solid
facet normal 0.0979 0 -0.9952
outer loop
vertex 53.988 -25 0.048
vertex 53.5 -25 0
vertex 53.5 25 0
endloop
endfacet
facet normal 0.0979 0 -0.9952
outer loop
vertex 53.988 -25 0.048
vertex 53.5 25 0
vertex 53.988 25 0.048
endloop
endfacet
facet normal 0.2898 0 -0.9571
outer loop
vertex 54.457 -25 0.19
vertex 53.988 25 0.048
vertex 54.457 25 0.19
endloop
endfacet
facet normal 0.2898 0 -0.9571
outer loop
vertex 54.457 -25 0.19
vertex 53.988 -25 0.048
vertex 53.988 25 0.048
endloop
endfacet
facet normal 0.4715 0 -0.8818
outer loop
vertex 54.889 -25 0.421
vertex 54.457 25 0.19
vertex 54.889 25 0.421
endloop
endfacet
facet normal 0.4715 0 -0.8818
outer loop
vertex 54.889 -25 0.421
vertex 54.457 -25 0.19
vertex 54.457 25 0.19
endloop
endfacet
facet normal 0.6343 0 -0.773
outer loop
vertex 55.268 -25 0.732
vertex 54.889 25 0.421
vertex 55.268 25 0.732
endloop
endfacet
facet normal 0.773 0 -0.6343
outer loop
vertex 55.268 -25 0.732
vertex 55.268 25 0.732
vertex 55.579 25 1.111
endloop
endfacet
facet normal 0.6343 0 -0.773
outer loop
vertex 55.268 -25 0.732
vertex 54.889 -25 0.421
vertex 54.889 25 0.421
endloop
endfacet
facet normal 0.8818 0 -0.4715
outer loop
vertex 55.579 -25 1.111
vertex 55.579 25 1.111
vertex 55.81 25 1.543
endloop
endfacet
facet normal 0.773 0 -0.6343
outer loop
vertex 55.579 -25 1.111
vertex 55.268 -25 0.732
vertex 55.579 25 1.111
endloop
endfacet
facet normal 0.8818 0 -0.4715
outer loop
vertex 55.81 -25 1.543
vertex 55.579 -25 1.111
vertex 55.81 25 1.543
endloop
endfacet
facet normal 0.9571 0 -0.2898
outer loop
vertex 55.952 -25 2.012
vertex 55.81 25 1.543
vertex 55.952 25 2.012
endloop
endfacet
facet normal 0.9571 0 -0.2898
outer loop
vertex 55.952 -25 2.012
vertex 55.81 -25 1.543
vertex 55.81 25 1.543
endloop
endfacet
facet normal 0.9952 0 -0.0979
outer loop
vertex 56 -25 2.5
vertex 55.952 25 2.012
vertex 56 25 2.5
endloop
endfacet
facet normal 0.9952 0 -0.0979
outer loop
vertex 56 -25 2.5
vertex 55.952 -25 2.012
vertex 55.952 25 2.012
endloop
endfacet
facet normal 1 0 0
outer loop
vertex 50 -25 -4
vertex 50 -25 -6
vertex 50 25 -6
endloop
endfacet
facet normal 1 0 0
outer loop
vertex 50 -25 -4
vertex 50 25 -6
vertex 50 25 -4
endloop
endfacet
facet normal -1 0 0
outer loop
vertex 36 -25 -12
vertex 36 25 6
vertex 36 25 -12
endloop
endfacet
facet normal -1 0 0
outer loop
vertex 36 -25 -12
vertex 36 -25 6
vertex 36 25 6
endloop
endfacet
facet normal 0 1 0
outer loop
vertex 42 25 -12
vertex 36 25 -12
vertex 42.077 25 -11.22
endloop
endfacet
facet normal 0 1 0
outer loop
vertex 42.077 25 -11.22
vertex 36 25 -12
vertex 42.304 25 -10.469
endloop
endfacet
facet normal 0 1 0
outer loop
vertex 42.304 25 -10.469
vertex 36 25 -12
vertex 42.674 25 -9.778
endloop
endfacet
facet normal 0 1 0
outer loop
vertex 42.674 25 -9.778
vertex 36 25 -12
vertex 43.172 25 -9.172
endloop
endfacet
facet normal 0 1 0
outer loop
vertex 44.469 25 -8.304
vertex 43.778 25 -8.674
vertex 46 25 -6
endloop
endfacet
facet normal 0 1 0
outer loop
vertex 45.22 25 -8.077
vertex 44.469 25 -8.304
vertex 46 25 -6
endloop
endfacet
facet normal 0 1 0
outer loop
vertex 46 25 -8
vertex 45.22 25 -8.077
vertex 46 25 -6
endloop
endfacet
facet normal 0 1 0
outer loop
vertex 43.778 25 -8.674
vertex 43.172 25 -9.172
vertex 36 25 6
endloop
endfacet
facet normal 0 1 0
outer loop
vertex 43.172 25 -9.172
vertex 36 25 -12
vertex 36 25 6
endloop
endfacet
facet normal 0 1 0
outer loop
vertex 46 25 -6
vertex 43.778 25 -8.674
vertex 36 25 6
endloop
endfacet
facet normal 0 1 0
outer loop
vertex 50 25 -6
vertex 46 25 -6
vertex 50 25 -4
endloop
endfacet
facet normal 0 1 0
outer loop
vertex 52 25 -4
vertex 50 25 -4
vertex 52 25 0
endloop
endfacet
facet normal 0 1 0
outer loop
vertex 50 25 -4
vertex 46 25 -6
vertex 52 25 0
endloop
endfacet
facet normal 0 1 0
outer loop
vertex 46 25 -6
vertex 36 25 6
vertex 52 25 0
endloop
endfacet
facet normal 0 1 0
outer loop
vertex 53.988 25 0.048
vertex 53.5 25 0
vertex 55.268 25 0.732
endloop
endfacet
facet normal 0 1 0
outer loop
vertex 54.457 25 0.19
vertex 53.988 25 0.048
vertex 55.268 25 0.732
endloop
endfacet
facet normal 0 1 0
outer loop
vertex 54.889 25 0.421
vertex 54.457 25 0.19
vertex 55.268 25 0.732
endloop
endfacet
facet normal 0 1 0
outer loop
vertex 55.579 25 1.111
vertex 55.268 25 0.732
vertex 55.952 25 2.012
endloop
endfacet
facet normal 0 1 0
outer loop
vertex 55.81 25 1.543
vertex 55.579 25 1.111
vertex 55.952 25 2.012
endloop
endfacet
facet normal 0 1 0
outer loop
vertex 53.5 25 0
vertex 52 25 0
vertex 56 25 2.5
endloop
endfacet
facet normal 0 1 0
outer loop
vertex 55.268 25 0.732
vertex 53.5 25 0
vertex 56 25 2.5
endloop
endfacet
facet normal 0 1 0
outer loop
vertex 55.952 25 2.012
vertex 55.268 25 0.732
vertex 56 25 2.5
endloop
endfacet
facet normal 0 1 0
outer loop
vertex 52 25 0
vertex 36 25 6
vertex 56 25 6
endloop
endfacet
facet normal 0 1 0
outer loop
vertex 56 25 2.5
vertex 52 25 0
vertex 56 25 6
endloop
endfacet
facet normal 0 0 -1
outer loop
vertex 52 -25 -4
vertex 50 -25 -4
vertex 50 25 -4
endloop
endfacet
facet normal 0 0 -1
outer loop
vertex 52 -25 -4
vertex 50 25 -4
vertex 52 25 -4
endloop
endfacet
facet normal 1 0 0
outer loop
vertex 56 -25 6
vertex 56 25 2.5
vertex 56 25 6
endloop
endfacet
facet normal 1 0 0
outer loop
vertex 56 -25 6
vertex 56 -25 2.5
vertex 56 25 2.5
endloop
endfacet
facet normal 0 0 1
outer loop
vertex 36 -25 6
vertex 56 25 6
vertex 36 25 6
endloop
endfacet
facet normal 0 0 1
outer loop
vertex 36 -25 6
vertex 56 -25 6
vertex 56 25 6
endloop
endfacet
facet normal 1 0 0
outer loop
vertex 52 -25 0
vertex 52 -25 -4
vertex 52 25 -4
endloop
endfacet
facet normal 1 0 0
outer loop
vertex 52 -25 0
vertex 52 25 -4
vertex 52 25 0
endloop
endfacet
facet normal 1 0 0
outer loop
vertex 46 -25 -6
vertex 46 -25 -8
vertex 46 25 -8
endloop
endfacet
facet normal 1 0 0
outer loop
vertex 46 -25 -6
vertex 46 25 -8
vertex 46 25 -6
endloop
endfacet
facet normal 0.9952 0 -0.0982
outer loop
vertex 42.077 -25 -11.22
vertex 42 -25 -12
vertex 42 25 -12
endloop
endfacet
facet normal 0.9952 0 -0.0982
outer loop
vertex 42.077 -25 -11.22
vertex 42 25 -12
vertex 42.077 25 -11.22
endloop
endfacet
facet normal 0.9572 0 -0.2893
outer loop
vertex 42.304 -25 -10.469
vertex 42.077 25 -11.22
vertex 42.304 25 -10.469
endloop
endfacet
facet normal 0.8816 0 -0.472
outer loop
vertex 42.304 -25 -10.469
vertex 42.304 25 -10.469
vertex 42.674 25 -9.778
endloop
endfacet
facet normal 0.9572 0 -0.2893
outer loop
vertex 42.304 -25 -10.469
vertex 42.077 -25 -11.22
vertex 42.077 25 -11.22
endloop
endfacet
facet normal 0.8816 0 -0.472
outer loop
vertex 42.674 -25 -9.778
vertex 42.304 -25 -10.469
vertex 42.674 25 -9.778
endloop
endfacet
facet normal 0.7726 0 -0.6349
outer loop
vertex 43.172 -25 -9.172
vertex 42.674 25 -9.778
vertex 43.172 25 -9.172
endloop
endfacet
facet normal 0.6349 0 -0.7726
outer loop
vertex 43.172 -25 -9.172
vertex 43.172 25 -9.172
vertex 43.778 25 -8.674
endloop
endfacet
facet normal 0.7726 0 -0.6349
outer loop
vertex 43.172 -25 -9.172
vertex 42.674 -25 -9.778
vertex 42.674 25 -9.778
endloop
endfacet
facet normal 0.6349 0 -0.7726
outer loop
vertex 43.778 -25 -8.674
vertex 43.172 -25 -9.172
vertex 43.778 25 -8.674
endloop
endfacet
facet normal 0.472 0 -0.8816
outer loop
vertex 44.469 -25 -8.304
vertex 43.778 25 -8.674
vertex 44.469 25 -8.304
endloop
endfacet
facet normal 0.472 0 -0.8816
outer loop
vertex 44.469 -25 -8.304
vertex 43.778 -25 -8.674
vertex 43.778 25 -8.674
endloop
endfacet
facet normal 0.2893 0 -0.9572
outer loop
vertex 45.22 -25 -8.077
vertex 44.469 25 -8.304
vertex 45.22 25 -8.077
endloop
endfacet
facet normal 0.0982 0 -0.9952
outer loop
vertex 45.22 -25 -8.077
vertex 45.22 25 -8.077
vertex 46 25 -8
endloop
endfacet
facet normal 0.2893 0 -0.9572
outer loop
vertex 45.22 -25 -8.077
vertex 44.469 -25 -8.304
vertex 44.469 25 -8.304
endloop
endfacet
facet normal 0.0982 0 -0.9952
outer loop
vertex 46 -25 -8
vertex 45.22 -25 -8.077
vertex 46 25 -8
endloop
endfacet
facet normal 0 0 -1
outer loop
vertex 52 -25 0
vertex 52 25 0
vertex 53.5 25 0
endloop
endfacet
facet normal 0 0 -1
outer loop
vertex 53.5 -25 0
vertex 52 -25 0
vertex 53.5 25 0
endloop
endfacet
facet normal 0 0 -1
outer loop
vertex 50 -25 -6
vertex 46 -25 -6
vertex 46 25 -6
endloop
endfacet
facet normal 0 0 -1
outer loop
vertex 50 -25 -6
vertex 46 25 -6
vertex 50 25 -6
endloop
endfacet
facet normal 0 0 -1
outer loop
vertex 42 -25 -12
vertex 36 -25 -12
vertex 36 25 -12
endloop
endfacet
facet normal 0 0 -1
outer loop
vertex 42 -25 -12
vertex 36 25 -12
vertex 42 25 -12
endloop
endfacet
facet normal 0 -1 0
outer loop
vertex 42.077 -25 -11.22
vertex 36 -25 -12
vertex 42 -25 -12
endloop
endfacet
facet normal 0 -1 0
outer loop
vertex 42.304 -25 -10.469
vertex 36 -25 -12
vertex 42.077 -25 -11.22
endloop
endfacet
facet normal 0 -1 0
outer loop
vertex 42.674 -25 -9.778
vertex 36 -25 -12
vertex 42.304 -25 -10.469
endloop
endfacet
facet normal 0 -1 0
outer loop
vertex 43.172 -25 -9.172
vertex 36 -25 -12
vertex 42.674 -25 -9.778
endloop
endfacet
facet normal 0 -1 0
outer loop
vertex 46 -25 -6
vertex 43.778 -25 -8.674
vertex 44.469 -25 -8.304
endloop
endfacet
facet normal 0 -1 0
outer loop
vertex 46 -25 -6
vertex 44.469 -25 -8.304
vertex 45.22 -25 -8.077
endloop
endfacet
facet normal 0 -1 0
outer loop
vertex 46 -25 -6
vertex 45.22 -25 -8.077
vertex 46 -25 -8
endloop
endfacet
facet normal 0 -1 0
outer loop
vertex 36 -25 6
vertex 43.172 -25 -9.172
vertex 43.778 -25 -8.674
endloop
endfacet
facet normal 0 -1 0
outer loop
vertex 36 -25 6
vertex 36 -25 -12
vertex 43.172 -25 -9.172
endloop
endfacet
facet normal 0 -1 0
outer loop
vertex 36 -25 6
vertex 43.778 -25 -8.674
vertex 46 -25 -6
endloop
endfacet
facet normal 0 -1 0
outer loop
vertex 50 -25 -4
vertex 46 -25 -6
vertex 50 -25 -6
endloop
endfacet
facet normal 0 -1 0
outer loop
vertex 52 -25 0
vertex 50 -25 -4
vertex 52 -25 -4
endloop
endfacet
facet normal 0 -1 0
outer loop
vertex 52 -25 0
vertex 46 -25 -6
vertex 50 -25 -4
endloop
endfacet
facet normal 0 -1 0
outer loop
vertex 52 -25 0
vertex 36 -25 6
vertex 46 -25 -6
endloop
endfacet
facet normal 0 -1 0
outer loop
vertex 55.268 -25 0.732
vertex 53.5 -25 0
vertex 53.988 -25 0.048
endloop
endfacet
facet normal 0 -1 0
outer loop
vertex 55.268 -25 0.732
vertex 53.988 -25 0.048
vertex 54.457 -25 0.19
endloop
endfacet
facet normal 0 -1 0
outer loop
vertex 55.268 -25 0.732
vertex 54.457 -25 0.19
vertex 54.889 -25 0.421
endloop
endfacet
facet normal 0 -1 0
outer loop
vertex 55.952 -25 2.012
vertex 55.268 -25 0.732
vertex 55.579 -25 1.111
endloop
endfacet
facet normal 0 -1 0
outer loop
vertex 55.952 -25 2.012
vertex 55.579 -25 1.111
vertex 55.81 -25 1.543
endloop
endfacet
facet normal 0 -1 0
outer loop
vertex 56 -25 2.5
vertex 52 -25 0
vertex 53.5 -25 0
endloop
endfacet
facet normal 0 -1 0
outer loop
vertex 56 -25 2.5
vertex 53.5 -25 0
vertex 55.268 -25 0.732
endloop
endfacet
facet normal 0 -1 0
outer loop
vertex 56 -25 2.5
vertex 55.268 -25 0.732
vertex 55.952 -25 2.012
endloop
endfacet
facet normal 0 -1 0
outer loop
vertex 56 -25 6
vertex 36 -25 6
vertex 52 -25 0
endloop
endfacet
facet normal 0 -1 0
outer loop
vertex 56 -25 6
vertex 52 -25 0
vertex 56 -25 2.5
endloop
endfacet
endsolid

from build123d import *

# Parameters (mm, degrees)
F1_DEPTH = 25


# Not quite as in the source:
# - a feature names something its author has since deleted; it is built from what else it names


with BuildPart() as f1:
    # F0 (on Front) → F1 (new body, symmetric)
    with BuildSketch(Plane.XZ):
        with BuildLine():
            Line((36, 6), (36, 0))
            Line((36, 0), (52, 0))
            Line((52, 0), (53.5, 0))
            ThreePointArc((53.5, 0), (55.267766953, 0.732233047), (56, 2.5))
            Line((56, 2.5), (56, 6))
            Line((56, 6), (36, 6))
        make_face()
        Polygon((52, 0), (36, 0), (36, -4), (50, -4), (52, -4), align=None)
        Polygon((50, -4), (36, -4), (36, -6), (46, -6), (50, -6), align=None)
        with BuildLine():
            Line((46, -6), (36, -6))
            Line((36, -6), (36, -12))
            Line((36, -12), (42, -12))
            ThreePointArc((42, -12), (43.1715728753, -9.1715728753), (46, -8))
            Line((46, -8), (46, -6))
        make_face()
    extrude(amount=F1_DEPTH, both=True)


solid = f1.part
